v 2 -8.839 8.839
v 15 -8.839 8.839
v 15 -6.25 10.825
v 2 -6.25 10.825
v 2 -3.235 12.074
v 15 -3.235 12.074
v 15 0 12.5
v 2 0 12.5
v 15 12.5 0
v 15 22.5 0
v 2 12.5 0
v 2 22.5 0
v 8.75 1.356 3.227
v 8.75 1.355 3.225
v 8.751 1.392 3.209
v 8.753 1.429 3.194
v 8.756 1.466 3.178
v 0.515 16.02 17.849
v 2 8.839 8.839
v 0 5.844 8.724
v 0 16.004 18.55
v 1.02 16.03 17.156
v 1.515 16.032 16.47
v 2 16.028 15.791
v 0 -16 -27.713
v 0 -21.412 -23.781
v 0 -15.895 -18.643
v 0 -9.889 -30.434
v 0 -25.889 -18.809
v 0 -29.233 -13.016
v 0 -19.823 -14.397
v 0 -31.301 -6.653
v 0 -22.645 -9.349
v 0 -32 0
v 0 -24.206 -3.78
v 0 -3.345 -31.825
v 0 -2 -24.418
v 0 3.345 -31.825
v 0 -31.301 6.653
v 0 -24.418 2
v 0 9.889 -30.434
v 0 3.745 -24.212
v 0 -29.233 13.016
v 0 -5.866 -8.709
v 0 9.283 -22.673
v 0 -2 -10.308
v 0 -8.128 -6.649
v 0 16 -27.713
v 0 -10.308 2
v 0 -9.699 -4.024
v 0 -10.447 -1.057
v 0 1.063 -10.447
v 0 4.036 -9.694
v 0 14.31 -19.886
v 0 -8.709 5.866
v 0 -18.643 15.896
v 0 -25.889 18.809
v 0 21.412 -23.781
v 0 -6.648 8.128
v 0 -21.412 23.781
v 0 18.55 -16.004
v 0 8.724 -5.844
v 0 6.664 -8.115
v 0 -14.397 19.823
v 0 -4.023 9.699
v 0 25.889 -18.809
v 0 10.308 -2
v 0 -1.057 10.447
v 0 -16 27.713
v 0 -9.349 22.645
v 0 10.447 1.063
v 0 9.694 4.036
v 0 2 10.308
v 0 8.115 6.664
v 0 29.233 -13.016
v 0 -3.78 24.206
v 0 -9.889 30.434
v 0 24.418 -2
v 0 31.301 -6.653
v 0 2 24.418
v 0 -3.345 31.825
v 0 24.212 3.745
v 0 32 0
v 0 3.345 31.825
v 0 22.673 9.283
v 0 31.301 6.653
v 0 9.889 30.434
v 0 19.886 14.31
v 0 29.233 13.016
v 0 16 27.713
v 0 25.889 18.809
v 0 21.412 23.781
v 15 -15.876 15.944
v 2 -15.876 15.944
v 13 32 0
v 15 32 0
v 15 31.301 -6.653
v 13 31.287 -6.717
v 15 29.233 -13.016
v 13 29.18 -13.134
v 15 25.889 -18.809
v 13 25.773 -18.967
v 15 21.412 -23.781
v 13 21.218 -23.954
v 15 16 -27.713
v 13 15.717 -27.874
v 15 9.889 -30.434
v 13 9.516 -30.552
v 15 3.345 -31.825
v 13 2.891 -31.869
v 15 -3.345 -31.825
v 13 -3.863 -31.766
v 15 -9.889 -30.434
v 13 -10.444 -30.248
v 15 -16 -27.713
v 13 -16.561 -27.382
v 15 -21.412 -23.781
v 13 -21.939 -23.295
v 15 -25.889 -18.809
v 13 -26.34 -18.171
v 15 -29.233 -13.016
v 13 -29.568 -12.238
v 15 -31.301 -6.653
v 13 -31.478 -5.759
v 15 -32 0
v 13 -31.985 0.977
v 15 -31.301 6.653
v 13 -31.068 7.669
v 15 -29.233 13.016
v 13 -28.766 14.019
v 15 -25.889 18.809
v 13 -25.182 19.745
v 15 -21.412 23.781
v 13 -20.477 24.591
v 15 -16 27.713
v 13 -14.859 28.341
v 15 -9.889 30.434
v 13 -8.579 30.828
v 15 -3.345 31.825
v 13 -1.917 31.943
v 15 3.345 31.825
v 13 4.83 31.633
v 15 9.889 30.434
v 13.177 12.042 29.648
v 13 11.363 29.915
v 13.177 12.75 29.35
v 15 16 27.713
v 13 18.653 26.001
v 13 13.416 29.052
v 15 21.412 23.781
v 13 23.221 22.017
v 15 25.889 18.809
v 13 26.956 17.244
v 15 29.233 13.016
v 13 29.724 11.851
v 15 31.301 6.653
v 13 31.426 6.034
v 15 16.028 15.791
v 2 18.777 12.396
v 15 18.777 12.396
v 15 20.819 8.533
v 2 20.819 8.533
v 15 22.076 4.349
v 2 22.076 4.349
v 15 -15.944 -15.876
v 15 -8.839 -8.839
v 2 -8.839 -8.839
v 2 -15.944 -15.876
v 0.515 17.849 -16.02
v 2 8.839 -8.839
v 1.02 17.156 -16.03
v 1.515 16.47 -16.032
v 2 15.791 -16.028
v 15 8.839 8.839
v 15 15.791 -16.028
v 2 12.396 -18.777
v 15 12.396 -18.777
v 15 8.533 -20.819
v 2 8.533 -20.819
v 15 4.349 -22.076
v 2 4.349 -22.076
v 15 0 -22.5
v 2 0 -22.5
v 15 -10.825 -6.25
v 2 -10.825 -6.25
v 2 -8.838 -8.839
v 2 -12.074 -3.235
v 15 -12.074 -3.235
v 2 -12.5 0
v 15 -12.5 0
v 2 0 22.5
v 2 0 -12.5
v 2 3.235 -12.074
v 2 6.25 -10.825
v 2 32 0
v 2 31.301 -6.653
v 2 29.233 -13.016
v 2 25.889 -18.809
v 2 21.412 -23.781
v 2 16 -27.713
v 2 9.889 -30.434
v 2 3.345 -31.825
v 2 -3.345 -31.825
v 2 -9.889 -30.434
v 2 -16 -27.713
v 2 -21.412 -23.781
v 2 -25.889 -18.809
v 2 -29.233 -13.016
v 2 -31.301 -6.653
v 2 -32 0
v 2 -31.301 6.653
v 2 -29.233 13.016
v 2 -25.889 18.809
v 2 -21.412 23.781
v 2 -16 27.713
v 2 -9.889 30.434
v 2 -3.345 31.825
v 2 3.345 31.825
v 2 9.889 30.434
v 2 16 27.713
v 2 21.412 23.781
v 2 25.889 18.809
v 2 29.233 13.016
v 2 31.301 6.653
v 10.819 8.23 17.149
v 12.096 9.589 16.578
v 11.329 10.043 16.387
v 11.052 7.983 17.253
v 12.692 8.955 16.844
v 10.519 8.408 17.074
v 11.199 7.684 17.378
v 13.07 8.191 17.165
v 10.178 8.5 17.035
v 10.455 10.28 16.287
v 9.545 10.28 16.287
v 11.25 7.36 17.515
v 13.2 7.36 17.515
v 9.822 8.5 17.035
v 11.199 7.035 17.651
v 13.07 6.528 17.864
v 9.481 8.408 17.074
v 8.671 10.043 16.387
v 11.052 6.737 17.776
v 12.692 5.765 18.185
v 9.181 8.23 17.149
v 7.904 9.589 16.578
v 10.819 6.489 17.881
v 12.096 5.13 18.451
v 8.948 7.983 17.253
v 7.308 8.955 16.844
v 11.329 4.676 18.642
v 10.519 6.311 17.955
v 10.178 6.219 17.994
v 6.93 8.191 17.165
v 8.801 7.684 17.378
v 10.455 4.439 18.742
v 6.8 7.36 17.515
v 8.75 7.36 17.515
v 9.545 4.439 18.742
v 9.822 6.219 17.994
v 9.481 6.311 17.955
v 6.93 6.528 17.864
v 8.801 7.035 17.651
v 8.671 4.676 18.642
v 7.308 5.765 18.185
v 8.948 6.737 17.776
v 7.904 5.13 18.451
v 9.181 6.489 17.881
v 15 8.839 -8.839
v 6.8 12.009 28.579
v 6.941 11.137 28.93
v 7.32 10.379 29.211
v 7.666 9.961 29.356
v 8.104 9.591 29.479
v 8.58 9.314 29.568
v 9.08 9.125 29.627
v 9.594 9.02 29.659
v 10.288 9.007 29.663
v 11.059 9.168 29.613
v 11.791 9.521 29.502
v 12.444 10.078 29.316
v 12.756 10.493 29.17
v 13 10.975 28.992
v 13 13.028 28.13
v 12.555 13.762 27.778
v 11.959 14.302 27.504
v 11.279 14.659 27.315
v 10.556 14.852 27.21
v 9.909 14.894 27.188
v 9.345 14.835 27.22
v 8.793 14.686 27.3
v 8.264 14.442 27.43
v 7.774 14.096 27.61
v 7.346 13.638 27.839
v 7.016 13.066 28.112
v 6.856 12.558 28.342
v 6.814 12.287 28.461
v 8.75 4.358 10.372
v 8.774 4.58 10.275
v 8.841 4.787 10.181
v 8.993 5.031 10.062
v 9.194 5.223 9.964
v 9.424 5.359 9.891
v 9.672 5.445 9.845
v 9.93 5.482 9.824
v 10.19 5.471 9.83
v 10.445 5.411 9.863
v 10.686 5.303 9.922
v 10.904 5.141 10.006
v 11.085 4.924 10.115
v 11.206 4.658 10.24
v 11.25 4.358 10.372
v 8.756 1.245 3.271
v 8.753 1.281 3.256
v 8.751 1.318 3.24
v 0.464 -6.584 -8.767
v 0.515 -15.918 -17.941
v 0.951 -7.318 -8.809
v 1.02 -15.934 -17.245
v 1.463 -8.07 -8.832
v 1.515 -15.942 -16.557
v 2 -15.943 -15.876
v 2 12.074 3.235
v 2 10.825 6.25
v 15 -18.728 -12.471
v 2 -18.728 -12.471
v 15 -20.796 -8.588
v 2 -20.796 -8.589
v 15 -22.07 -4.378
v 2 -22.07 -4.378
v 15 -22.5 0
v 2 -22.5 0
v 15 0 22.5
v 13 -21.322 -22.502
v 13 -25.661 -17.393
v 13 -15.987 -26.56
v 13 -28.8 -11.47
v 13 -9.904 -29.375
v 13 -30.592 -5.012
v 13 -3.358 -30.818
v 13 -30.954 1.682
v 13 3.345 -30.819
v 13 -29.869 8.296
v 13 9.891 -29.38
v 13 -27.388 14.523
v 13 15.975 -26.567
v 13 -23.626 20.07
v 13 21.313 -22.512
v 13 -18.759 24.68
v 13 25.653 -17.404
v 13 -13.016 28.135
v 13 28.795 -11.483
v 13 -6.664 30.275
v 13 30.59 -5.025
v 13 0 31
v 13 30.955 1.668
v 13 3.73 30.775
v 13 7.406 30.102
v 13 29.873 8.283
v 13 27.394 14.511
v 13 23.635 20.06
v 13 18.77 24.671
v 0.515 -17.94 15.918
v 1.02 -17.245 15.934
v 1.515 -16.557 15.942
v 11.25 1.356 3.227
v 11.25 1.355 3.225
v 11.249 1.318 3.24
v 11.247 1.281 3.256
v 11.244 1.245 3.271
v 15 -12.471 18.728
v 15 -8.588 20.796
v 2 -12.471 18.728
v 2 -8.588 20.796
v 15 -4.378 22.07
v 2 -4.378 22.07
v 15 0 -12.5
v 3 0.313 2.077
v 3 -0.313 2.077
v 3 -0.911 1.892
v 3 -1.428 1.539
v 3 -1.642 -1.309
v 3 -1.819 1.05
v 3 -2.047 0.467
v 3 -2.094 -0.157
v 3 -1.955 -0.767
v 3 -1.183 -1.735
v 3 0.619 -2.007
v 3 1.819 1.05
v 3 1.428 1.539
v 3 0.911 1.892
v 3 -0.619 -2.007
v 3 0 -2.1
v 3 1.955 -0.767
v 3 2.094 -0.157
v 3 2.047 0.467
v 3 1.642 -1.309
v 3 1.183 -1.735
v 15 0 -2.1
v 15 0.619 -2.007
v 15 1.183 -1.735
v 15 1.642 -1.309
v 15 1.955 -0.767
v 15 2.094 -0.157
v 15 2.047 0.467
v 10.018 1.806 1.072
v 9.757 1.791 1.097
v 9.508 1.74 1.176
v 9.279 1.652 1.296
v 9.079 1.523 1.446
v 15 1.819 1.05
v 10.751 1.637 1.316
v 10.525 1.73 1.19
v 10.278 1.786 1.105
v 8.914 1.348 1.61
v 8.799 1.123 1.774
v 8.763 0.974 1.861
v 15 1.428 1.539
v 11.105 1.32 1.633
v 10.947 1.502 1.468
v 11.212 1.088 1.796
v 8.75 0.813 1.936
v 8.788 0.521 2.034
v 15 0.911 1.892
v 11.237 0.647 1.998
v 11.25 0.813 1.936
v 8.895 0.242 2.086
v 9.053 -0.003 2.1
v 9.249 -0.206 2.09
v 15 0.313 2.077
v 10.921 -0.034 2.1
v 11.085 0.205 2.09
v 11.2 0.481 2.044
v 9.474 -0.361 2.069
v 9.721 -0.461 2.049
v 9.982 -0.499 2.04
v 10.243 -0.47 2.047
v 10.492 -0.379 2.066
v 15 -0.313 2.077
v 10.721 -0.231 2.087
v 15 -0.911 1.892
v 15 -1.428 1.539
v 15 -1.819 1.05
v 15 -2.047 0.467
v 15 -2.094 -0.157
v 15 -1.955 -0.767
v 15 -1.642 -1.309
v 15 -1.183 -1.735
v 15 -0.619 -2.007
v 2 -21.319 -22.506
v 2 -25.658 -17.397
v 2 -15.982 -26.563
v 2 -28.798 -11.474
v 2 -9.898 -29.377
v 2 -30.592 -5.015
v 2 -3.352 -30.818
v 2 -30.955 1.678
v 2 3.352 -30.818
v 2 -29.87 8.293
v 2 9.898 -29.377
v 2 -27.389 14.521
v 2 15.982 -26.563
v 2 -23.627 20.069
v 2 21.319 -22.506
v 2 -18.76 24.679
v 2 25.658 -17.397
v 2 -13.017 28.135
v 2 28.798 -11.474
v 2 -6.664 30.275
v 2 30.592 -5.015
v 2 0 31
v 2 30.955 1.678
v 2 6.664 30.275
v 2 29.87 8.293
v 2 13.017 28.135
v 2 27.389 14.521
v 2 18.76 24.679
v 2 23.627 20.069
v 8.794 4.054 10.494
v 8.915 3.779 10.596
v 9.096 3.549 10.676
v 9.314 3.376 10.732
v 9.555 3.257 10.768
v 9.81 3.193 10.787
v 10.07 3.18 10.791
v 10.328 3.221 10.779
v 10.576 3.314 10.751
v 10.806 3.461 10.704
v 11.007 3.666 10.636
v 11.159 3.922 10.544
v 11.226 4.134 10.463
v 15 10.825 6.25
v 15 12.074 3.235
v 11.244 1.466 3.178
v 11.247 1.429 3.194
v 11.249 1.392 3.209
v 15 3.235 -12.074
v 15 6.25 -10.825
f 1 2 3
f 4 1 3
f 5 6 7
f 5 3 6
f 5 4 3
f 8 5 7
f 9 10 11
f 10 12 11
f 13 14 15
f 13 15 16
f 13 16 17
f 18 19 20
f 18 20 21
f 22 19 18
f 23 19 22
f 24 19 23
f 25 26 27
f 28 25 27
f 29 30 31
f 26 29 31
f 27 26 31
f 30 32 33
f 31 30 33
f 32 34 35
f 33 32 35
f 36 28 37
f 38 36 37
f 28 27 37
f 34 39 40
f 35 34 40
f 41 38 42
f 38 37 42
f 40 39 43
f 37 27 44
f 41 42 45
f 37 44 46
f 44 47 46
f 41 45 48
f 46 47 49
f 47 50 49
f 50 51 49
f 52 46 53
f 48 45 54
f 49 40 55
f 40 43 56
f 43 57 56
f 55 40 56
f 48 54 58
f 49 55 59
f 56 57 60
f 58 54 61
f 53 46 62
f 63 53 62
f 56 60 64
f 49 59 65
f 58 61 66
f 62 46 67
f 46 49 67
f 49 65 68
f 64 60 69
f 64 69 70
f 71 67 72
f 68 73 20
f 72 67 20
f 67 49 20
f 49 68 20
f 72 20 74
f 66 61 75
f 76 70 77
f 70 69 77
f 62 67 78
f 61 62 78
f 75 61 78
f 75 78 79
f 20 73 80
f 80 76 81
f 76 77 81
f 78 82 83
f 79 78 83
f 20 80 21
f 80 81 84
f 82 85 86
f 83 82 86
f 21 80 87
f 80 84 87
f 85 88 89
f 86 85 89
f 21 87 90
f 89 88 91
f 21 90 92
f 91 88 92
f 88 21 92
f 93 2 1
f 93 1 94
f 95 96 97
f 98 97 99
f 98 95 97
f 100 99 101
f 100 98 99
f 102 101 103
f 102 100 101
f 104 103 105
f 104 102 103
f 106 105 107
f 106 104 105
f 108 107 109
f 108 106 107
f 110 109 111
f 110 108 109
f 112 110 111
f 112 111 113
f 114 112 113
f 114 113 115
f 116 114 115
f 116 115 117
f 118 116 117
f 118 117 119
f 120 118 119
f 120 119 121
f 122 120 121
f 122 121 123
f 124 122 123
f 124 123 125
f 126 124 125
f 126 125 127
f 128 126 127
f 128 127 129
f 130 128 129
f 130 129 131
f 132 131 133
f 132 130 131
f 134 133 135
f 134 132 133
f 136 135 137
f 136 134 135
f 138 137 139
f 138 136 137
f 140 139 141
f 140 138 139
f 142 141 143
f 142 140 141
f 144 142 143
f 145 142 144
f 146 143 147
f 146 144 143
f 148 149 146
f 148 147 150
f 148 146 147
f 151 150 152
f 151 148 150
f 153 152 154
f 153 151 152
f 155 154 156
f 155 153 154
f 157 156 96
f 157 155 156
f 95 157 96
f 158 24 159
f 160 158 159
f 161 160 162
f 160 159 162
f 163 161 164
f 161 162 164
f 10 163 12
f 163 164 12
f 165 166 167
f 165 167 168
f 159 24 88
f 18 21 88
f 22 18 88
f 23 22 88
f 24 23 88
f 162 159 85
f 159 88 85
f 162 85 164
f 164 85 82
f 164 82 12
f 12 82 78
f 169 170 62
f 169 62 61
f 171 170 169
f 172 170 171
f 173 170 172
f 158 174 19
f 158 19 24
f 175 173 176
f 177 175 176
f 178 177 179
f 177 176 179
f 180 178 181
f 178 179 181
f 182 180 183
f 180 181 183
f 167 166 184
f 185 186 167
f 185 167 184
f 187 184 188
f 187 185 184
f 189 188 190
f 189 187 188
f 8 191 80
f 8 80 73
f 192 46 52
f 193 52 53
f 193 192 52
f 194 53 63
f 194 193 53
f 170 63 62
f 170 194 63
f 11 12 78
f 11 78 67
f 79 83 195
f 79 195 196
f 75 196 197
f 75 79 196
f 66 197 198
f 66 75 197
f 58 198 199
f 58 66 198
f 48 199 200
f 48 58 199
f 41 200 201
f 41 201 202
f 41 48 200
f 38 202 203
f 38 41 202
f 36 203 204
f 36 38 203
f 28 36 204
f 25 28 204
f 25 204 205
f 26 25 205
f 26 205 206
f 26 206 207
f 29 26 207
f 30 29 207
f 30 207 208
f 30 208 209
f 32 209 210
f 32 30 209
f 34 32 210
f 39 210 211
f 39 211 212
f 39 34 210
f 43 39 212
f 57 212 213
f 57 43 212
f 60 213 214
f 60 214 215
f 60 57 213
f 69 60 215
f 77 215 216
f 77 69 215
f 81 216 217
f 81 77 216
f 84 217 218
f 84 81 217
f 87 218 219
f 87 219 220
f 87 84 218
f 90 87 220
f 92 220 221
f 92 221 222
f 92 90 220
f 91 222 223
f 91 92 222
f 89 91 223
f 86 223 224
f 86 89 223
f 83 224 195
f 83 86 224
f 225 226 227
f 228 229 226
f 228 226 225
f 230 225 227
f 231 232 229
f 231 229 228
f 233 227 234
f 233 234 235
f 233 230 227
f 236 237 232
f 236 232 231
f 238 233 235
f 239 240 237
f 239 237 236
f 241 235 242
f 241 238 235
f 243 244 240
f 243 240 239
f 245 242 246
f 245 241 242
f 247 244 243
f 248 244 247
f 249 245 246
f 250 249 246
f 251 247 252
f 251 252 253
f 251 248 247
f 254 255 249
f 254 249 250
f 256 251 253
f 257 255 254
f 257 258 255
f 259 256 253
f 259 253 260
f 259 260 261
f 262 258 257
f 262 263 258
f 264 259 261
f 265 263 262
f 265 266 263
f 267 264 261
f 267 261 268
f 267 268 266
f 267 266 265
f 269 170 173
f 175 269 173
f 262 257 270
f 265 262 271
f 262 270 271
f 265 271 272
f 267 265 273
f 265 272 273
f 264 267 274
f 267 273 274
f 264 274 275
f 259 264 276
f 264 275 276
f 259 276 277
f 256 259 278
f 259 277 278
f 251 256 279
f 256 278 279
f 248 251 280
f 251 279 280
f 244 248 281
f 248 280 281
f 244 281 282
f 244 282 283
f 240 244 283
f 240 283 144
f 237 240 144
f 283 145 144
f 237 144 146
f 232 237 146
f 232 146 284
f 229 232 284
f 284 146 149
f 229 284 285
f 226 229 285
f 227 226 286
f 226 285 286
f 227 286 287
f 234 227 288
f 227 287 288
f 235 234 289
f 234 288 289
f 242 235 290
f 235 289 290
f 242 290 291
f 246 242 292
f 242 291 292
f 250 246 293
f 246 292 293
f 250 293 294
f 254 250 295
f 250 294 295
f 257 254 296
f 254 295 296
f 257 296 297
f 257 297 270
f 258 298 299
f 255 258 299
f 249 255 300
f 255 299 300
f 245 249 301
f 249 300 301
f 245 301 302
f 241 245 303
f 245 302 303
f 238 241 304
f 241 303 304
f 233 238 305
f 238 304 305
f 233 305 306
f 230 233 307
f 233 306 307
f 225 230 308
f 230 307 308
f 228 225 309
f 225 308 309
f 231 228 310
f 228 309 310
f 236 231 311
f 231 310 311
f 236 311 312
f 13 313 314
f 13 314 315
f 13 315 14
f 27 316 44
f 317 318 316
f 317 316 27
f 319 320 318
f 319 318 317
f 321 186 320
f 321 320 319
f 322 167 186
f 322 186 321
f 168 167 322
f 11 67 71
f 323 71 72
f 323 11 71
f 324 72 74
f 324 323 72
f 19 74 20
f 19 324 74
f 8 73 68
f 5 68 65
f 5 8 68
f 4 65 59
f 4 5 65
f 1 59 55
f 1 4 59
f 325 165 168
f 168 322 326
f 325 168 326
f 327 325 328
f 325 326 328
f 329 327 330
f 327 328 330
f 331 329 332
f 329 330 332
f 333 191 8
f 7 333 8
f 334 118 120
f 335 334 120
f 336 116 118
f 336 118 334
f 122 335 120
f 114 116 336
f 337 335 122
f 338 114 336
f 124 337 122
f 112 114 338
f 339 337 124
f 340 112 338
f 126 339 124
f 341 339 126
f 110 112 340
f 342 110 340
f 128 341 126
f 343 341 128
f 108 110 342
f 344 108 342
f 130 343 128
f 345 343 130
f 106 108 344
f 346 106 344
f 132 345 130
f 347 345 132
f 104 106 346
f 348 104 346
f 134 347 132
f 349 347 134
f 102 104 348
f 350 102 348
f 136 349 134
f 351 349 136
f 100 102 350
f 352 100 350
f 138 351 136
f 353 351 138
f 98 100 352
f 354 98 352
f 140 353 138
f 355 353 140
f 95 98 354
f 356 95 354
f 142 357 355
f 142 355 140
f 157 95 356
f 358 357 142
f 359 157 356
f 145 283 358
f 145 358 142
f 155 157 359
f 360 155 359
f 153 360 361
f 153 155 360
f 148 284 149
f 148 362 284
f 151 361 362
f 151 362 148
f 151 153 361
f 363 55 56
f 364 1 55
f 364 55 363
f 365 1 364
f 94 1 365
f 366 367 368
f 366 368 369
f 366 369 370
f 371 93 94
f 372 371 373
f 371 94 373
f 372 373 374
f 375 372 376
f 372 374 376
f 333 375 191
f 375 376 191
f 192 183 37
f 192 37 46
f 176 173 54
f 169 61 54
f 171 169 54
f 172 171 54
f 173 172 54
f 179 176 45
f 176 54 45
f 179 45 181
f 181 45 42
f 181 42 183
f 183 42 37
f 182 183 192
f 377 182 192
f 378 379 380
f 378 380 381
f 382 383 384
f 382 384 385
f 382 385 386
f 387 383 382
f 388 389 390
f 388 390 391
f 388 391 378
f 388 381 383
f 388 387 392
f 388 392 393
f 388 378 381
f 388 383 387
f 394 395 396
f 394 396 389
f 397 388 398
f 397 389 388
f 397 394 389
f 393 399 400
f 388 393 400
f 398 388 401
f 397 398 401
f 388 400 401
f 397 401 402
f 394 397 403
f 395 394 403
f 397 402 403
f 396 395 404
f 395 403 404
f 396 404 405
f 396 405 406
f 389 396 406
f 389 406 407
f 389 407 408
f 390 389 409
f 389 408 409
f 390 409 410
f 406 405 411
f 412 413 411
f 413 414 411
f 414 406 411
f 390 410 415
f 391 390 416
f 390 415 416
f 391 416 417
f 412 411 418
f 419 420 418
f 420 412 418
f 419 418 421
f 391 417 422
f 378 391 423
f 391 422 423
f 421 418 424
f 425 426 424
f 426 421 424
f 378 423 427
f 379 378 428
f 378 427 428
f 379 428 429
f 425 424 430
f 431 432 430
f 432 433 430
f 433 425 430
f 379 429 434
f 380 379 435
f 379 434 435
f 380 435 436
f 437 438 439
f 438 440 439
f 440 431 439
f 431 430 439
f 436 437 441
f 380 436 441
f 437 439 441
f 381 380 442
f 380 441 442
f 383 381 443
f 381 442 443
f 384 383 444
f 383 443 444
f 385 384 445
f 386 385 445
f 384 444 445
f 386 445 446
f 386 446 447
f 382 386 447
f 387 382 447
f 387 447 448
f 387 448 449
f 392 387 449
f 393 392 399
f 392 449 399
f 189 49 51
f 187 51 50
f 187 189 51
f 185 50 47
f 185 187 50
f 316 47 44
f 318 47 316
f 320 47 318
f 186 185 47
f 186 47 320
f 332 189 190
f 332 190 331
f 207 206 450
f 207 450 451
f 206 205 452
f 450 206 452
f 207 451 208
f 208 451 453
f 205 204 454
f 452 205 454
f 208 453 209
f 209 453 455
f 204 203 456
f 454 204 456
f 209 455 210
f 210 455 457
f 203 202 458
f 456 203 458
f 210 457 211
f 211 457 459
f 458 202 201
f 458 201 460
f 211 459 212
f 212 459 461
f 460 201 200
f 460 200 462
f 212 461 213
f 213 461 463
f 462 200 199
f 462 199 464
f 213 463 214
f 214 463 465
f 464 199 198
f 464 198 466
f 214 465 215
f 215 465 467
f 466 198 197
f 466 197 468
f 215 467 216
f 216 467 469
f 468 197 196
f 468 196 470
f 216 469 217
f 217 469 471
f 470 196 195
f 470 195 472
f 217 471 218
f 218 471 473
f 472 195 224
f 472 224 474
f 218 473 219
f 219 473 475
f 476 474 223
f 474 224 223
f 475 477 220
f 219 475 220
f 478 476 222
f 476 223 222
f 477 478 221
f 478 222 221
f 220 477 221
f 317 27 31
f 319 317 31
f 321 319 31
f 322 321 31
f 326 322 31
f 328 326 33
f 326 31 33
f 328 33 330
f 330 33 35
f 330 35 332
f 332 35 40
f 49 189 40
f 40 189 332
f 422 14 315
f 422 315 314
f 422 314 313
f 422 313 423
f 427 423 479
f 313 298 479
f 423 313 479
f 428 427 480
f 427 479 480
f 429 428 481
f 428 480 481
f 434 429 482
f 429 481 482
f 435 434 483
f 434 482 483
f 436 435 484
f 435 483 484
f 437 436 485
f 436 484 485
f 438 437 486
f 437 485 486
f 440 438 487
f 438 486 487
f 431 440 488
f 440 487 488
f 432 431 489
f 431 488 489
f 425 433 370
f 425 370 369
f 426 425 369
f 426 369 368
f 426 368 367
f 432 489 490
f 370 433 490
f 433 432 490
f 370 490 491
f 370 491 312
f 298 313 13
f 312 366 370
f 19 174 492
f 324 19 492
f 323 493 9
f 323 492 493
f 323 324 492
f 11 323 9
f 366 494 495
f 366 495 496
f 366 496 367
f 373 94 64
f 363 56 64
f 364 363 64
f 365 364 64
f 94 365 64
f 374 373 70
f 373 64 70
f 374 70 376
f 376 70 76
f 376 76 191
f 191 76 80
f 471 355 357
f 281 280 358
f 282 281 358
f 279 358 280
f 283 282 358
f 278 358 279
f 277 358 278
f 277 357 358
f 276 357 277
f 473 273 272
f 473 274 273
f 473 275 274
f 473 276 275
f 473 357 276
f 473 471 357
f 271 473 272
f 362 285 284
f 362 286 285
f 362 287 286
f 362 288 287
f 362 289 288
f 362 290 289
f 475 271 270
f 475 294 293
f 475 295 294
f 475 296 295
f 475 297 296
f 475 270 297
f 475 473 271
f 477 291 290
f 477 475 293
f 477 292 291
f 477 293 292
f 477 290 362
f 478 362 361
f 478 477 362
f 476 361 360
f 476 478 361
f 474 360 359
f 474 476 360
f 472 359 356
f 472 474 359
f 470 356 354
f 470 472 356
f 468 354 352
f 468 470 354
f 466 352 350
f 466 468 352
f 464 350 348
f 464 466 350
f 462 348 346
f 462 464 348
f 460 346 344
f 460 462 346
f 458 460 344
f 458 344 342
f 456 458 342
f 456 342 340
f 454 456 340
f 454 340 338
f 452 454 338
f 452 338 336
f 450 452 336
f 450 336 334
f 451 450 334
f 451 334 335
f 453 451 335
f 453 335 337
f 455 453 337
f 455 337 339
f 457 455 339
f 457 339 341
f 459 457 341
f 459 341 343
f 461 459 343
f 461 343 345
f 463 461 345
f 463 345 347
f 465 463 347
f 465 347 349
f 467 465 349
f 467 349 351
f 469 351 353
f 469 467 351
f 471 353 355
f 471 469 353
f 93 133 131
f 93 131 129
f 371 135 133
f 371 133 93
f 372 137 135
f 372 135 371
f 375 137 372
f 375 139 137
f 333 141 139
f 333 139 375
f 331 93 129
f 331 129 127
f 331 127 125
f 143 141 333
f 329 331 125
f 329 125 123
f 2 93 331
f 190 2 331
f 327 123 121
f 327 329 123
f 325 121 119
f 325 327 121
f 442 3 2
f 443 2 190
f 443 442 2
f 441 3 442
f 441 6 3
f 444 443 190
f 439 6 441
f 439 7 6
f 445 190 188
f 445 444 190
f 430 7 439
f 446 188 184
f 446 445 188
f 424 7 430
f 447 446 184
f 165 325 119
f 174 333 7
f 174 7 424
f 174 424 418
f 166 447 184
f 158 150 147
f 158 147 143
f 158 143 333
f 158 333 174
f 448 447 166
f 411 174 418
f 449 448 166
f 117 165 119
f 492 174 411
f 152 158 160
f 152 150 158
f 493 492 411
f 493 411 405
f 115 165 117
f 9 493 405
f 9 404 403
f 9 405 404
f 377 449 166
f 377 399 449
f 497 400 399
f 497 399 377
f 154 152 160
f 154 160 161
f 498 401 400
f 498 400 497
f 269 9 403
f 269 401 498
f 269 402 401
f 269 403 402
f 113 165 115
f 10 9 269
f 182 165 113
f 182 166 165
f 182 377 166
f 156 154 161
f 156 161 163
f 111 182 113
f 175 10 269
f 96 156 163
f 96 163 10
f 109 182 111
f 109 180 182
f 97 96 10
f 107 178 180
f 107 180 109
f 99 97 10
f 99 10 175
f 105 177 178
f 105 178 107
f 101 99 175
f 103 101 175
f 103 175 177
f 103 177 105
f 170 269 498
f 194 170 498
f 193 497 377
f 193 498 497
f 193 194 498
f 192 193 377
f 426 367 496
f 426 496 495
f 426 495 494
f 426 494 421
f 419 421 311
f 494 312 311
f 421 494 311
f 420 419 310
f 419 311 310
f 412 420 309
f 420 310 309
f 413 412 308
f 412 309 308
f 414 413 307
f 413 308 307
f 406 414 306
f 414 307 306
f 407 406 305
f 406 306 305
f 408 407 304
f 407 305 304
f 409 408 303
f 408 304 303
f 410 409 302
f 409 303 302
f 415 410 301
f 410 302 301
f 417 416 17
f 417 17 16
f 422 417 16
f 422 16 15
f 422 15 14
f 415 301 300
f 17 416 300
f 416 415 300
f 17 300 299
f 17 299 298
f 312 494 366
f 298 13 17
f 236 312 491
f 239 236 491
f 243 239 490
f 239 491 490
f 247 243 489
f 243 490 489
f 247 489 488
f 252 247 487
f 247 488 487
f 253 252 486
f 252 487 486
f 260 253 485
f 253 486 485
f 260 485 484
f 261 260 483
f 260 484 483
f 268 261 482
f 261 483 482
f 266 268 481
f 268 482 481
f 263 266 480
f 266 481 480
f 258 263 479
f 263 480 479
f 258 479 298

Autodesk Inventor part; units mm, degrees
ref_plane "XZ Plane" through (0, 0, 0) normal (0, 1, 0) x (-1, 0, 0)
ref_plane "XY Plane" through (0, 0, 0) normal (0, 0, 1) x (1, 0, 0)
sketch "Эскиз1" plane through (0, 0, 0) normal (1, 0, 0) x (0, 1, 0)
  circle A0 centre (0, 0) radius 33
  circle A1 centre (0, 0) radius 27.5
  line L0 (27.5, 0) -> (12.5, 0)
  line L1 (0, 27.5) -> (0, 12.5)
  arc A2 (0, -12.5) -> (12.5, 0) centre (0, 0) ccw
  arc A3 (-12.5, 0) -> (0, -12.5) centre (0, 0) ccw
  arc A4 (0, 12.5) -> (-12.5, 0) centre (0, 0) ccw
  arc A5 (12.5, 0) -> (0, 12.5) centre (0, 0) ccw
  line L2 (27.5, 0) -> (22.5, 0)
  line L3 (0, -27.5) -> (0, -22.5)
  line L4 (27.5, 0) -> (22.5, 0)
  line L5 (0, 27.5) -> (0, 22.5)
  line L6 (-27.5, 0) -> (-22.5, 0)
  circle A6 centre (0, 0) radius 22.5
  line L7 (-8.8388, -8.8388) -> (-15.9436, -15.8761)
  line L8 (-12.5, 0) -> (-22.5, 0)
  line L9 (-8.8388, 8.8388) -> (-15.8761, 15.9436)
  line L10 (8.8388, 8.8388) -> (16.0277, 15.7912)
  line L11 (12.5, 0) -> (22.5, 0)
  line L12 (0, 12.5) -> (0, 22.5)
  line L13 (8.8388, -8.8388) -> (15.7912, -16.0277)
  line L14 (0, -22.5) -> (0, -12.5)
  circle A7 centre (0, 0) radius 27.5
  circle A8 centre (0, 0) radius 32
  point P0 (-27.5, 0)
  point P1 (0, 22.5)
  point P2 (0, 22.5)
  point P3 (-22.5, 0)
  point P4 (-22.5, 0)
  dimension "d2" = 15
  dimension "d3" = 15
  dimension "d4" = 15
  dimension "d5" = 15
  dimension "d21" = 5
  dimension "d22" = 5
  dimension "d25" = 360
  dimension "d67" = 64
extrude "Выдавливание1" add sketch "Эскиз1" along normal blind 15 contours L0 A6 L1 A1 | A1 L3 A6 L0 | L1 A6 L6 A1 | A1 L6 A6 L3 | A6 L13 A2 L0 | L0 A5 L10 A6 | A6 L10 A5 L1 | L1 A4 L9 A6 | L14 A2 L13 A6 | A6 L7 A3 L14 | A2 A3 A4 A5 | L8 A3 L7 A6 | A6 L9 A4 L8 | A8
sketch "Эскиз5" plane through (15, 0, 0) normal (1, 0, 0) x (0, 0, -1)
  point P0 (0, 0)
extrude "Выдавливание3" cut sketch "Эскиз1" along normal blind 15 contours L0 A5 L10 A6 | L1 A4 L9 A6 | L14 A2 L13 A6 | L8 A3 L7 A6
sketch "Эскиз6" plane through (15, 0, 0) normal (1, 0, 0) x (0, 0, -1)
  circle A0 centre (0, 0) radius 11.25
  arc A1 (0, 12.5) -> (-8.8388, 8.8388) centre (0, 0) ccw projected
  arc A2 (0, 12.5) -> (-8.8388, 8.8388) centre (0, 0) ccw
  line L0 (0, 0) -> (-3.0615, 7.391) construction
  circle A3 centre (-3.0615, 7.391) radius 1.5
  circle A4 centre (-7.391, -3.0615) radius 1.5
  circle A5 centre (3.0615, -7.391) radius 1.5
  circle A6 centre (7.391, 3.0615) radius 1.5
  arc A7 (-3.0615, 7.391) -> (-7.391, -3.0615) centre (0, 0) ccw
  line L1 (-8.8388, 8.8388) -> (-22.3952, 22.8573) construction
  circle A8 centre (0, 0) radius 32 construction
  line L2 (-8.8388, 8.8388) -> (10.6622, 8.8388) construction
  arc A9 (-22.3952, 22.8573) -> (-32, 0) centre (0, 0) ccw construction
  line L3 (-29.5012, 12.3966) -> (-7.391, 3.0615)
  dimension "d31" = 22.5
  dimension "d72" = 8
  dimension "d74" = 3
  dimension "d77" = 360
  dimension "d79" = 134.04
extrude "Выдавливание4" [suppressed]
extrude "Выдавливание5" cut sketch "Эскиз6" against normal blind 12 contours A3 | A4 | A0 | A5 | A6
extrude "Выдавливание6" [suppressed]
chamfer "Фаска2" distance 2 angle 45 1 edges at (0, -12.3912, -12.3575)
chamfer "Фаска3" distance 2 angle 45 15 edges at (0, -20.7964, -8.5883) (0, -17.5, 0) (0, -11.5485, -4.7835) (0, 0, -17.5) (0, 8.5331, -20.8191) (0, 12.315, -12.4333) (0, 4.7835, -11.5485) (0, 17.5, 0) (0, 11.5485, 4.7835) (0, 20.8191, 8.5331) (0, 12.4333, 12.315) (0, 0, 17.5) (0, -4.7835, 11.5485) (0, -12.3575, 12.3912) (0, -8.5883, 20.7964)
ref_plane "РабПлоскость3" through (2, 0, 0) normal (1, 0, 0) x (0, 1, 0)
sketch "Эскиз10" plane through (2, 0, 0) normal (1, 0, 0) x (0, 1, 0)
  circle A0 centre (0, 0) radius 26.5
  circle A1 centre (0, 0) radius 27.5 projected
  circle A2 centre (0, 0) radius 26.5
  dimension "d66" = 53
sketch "Эскиз11" plane through (0, 0, 0) normal (-1, 0, 0) x (0, 0, 1)
  circle A0 centre (0, 0) radius 31
  circle A1 centre (0, 0) radius 32
  dimension "d68" = 62
extrude "Выдавливание9" cut sketch "Эскиз11" against normal blind 11 from surface at -2
sketch "Эскиз12" plane through (15, 0, 0) normal (1, 0, 0) x (0, 0, -1)
  circle A0 centre (0, 0) radius 32 projected
  arc A1 (0, 12.5) -> (-8.8388, 8.8388) centre (0, 0) ccw projected
  line L0 (-8.8388, 8.8388) -> (-22.3952, 22.8573)
  circle A2 centre (0, 0) radius 32 projected
  line L1 (-8.8388, 8.8388) -> (10.6622, 8.8388) construction
  point P0 (0, 0)
  point P1 (-32, 0)
  dimension "d85" = 134.04
ref_plane "РабПлоскость4" through (15, 12.3966, 29.5012) normal (0, 0.3874, 0.9219) x (-1, 0, 0)
sketch "Эскиз14" plane through (15, 12.3966, 29.5012) normal (0, 0.3874, 0.9219) x (-1, 0, 0)
  line L0 (0, -11.25) -> (0, 11.25) projected
  line L1 (0, 0) -> (5, 0)
  circle A0 centre (5, 0) radius 3.2
  circle A1 centre (5, 0) radius 1.25
  point P0 (15, 0)
  point P1 (8, 0)
  dimension "d95" = 5
  dimension "d96" = 6.4
  dimension "d99" = 2.5
extrude "Выдавливание11" [suppressed]
sketch "Эскиз15" plane through (3, 0, 0) normal (1, 0, 0) x (0, 0, -1)
  circle A0 centre (0, 0) radius 2
  dimension "d90" = 4
sketch "Эскиз16" plane through (3, 0, 0) normal (1, 0, 0) x (0, 0, -1)
  circle A0 centre (0, 0) radius 3.5
  circle A1 centre (0, 0) radius 2
  dimension "d91" = 7
  dimension "d92" = 4
extrude "Выдавливание12" add sketch "Эскиз16" along normal blind 12
ref_plane "РабПлоскость6" through (15, 1.3559, 3.2267) normal (0, 0.3874, 0.9219) x (-1, 0, 0)
extrude "Выдавливание14" cut sketch "Эскиз14" along normal blind 16 from surface at -28.5 contours A1
sketch "Эскиз18" plane through (15, 0, 0) normal (1, 0, 0) x (0, 0, -1)
  circle A0 centre (0, 0) radius 3.5 projected
  circle A1 centre (0, 0) radius 3.5
  circle A2 centre (0, 0) radius 11.25
extrude "Выдавливание15" add sketch "Эскиз18" against normal blind 12
sketch "Эскиз19" plane through (15, 0, 0) normal (1, 0, 0) x (0, 0, -1)
  circle A0 centre (0, 0) radius 2.1
  dimension "d108" = 4.2
extrude "Выдавливание17" cut sketch "Эскиз19" against normal blind 12
extrude "Выдавливание18" cut sketch "Эскиз14" against normal blind 13 contours A1 | A0
extrude "Выдавливание19" cut sketch "Эскиз14" against normal blind 31 contours A1
properties part number "колеса прототип"
